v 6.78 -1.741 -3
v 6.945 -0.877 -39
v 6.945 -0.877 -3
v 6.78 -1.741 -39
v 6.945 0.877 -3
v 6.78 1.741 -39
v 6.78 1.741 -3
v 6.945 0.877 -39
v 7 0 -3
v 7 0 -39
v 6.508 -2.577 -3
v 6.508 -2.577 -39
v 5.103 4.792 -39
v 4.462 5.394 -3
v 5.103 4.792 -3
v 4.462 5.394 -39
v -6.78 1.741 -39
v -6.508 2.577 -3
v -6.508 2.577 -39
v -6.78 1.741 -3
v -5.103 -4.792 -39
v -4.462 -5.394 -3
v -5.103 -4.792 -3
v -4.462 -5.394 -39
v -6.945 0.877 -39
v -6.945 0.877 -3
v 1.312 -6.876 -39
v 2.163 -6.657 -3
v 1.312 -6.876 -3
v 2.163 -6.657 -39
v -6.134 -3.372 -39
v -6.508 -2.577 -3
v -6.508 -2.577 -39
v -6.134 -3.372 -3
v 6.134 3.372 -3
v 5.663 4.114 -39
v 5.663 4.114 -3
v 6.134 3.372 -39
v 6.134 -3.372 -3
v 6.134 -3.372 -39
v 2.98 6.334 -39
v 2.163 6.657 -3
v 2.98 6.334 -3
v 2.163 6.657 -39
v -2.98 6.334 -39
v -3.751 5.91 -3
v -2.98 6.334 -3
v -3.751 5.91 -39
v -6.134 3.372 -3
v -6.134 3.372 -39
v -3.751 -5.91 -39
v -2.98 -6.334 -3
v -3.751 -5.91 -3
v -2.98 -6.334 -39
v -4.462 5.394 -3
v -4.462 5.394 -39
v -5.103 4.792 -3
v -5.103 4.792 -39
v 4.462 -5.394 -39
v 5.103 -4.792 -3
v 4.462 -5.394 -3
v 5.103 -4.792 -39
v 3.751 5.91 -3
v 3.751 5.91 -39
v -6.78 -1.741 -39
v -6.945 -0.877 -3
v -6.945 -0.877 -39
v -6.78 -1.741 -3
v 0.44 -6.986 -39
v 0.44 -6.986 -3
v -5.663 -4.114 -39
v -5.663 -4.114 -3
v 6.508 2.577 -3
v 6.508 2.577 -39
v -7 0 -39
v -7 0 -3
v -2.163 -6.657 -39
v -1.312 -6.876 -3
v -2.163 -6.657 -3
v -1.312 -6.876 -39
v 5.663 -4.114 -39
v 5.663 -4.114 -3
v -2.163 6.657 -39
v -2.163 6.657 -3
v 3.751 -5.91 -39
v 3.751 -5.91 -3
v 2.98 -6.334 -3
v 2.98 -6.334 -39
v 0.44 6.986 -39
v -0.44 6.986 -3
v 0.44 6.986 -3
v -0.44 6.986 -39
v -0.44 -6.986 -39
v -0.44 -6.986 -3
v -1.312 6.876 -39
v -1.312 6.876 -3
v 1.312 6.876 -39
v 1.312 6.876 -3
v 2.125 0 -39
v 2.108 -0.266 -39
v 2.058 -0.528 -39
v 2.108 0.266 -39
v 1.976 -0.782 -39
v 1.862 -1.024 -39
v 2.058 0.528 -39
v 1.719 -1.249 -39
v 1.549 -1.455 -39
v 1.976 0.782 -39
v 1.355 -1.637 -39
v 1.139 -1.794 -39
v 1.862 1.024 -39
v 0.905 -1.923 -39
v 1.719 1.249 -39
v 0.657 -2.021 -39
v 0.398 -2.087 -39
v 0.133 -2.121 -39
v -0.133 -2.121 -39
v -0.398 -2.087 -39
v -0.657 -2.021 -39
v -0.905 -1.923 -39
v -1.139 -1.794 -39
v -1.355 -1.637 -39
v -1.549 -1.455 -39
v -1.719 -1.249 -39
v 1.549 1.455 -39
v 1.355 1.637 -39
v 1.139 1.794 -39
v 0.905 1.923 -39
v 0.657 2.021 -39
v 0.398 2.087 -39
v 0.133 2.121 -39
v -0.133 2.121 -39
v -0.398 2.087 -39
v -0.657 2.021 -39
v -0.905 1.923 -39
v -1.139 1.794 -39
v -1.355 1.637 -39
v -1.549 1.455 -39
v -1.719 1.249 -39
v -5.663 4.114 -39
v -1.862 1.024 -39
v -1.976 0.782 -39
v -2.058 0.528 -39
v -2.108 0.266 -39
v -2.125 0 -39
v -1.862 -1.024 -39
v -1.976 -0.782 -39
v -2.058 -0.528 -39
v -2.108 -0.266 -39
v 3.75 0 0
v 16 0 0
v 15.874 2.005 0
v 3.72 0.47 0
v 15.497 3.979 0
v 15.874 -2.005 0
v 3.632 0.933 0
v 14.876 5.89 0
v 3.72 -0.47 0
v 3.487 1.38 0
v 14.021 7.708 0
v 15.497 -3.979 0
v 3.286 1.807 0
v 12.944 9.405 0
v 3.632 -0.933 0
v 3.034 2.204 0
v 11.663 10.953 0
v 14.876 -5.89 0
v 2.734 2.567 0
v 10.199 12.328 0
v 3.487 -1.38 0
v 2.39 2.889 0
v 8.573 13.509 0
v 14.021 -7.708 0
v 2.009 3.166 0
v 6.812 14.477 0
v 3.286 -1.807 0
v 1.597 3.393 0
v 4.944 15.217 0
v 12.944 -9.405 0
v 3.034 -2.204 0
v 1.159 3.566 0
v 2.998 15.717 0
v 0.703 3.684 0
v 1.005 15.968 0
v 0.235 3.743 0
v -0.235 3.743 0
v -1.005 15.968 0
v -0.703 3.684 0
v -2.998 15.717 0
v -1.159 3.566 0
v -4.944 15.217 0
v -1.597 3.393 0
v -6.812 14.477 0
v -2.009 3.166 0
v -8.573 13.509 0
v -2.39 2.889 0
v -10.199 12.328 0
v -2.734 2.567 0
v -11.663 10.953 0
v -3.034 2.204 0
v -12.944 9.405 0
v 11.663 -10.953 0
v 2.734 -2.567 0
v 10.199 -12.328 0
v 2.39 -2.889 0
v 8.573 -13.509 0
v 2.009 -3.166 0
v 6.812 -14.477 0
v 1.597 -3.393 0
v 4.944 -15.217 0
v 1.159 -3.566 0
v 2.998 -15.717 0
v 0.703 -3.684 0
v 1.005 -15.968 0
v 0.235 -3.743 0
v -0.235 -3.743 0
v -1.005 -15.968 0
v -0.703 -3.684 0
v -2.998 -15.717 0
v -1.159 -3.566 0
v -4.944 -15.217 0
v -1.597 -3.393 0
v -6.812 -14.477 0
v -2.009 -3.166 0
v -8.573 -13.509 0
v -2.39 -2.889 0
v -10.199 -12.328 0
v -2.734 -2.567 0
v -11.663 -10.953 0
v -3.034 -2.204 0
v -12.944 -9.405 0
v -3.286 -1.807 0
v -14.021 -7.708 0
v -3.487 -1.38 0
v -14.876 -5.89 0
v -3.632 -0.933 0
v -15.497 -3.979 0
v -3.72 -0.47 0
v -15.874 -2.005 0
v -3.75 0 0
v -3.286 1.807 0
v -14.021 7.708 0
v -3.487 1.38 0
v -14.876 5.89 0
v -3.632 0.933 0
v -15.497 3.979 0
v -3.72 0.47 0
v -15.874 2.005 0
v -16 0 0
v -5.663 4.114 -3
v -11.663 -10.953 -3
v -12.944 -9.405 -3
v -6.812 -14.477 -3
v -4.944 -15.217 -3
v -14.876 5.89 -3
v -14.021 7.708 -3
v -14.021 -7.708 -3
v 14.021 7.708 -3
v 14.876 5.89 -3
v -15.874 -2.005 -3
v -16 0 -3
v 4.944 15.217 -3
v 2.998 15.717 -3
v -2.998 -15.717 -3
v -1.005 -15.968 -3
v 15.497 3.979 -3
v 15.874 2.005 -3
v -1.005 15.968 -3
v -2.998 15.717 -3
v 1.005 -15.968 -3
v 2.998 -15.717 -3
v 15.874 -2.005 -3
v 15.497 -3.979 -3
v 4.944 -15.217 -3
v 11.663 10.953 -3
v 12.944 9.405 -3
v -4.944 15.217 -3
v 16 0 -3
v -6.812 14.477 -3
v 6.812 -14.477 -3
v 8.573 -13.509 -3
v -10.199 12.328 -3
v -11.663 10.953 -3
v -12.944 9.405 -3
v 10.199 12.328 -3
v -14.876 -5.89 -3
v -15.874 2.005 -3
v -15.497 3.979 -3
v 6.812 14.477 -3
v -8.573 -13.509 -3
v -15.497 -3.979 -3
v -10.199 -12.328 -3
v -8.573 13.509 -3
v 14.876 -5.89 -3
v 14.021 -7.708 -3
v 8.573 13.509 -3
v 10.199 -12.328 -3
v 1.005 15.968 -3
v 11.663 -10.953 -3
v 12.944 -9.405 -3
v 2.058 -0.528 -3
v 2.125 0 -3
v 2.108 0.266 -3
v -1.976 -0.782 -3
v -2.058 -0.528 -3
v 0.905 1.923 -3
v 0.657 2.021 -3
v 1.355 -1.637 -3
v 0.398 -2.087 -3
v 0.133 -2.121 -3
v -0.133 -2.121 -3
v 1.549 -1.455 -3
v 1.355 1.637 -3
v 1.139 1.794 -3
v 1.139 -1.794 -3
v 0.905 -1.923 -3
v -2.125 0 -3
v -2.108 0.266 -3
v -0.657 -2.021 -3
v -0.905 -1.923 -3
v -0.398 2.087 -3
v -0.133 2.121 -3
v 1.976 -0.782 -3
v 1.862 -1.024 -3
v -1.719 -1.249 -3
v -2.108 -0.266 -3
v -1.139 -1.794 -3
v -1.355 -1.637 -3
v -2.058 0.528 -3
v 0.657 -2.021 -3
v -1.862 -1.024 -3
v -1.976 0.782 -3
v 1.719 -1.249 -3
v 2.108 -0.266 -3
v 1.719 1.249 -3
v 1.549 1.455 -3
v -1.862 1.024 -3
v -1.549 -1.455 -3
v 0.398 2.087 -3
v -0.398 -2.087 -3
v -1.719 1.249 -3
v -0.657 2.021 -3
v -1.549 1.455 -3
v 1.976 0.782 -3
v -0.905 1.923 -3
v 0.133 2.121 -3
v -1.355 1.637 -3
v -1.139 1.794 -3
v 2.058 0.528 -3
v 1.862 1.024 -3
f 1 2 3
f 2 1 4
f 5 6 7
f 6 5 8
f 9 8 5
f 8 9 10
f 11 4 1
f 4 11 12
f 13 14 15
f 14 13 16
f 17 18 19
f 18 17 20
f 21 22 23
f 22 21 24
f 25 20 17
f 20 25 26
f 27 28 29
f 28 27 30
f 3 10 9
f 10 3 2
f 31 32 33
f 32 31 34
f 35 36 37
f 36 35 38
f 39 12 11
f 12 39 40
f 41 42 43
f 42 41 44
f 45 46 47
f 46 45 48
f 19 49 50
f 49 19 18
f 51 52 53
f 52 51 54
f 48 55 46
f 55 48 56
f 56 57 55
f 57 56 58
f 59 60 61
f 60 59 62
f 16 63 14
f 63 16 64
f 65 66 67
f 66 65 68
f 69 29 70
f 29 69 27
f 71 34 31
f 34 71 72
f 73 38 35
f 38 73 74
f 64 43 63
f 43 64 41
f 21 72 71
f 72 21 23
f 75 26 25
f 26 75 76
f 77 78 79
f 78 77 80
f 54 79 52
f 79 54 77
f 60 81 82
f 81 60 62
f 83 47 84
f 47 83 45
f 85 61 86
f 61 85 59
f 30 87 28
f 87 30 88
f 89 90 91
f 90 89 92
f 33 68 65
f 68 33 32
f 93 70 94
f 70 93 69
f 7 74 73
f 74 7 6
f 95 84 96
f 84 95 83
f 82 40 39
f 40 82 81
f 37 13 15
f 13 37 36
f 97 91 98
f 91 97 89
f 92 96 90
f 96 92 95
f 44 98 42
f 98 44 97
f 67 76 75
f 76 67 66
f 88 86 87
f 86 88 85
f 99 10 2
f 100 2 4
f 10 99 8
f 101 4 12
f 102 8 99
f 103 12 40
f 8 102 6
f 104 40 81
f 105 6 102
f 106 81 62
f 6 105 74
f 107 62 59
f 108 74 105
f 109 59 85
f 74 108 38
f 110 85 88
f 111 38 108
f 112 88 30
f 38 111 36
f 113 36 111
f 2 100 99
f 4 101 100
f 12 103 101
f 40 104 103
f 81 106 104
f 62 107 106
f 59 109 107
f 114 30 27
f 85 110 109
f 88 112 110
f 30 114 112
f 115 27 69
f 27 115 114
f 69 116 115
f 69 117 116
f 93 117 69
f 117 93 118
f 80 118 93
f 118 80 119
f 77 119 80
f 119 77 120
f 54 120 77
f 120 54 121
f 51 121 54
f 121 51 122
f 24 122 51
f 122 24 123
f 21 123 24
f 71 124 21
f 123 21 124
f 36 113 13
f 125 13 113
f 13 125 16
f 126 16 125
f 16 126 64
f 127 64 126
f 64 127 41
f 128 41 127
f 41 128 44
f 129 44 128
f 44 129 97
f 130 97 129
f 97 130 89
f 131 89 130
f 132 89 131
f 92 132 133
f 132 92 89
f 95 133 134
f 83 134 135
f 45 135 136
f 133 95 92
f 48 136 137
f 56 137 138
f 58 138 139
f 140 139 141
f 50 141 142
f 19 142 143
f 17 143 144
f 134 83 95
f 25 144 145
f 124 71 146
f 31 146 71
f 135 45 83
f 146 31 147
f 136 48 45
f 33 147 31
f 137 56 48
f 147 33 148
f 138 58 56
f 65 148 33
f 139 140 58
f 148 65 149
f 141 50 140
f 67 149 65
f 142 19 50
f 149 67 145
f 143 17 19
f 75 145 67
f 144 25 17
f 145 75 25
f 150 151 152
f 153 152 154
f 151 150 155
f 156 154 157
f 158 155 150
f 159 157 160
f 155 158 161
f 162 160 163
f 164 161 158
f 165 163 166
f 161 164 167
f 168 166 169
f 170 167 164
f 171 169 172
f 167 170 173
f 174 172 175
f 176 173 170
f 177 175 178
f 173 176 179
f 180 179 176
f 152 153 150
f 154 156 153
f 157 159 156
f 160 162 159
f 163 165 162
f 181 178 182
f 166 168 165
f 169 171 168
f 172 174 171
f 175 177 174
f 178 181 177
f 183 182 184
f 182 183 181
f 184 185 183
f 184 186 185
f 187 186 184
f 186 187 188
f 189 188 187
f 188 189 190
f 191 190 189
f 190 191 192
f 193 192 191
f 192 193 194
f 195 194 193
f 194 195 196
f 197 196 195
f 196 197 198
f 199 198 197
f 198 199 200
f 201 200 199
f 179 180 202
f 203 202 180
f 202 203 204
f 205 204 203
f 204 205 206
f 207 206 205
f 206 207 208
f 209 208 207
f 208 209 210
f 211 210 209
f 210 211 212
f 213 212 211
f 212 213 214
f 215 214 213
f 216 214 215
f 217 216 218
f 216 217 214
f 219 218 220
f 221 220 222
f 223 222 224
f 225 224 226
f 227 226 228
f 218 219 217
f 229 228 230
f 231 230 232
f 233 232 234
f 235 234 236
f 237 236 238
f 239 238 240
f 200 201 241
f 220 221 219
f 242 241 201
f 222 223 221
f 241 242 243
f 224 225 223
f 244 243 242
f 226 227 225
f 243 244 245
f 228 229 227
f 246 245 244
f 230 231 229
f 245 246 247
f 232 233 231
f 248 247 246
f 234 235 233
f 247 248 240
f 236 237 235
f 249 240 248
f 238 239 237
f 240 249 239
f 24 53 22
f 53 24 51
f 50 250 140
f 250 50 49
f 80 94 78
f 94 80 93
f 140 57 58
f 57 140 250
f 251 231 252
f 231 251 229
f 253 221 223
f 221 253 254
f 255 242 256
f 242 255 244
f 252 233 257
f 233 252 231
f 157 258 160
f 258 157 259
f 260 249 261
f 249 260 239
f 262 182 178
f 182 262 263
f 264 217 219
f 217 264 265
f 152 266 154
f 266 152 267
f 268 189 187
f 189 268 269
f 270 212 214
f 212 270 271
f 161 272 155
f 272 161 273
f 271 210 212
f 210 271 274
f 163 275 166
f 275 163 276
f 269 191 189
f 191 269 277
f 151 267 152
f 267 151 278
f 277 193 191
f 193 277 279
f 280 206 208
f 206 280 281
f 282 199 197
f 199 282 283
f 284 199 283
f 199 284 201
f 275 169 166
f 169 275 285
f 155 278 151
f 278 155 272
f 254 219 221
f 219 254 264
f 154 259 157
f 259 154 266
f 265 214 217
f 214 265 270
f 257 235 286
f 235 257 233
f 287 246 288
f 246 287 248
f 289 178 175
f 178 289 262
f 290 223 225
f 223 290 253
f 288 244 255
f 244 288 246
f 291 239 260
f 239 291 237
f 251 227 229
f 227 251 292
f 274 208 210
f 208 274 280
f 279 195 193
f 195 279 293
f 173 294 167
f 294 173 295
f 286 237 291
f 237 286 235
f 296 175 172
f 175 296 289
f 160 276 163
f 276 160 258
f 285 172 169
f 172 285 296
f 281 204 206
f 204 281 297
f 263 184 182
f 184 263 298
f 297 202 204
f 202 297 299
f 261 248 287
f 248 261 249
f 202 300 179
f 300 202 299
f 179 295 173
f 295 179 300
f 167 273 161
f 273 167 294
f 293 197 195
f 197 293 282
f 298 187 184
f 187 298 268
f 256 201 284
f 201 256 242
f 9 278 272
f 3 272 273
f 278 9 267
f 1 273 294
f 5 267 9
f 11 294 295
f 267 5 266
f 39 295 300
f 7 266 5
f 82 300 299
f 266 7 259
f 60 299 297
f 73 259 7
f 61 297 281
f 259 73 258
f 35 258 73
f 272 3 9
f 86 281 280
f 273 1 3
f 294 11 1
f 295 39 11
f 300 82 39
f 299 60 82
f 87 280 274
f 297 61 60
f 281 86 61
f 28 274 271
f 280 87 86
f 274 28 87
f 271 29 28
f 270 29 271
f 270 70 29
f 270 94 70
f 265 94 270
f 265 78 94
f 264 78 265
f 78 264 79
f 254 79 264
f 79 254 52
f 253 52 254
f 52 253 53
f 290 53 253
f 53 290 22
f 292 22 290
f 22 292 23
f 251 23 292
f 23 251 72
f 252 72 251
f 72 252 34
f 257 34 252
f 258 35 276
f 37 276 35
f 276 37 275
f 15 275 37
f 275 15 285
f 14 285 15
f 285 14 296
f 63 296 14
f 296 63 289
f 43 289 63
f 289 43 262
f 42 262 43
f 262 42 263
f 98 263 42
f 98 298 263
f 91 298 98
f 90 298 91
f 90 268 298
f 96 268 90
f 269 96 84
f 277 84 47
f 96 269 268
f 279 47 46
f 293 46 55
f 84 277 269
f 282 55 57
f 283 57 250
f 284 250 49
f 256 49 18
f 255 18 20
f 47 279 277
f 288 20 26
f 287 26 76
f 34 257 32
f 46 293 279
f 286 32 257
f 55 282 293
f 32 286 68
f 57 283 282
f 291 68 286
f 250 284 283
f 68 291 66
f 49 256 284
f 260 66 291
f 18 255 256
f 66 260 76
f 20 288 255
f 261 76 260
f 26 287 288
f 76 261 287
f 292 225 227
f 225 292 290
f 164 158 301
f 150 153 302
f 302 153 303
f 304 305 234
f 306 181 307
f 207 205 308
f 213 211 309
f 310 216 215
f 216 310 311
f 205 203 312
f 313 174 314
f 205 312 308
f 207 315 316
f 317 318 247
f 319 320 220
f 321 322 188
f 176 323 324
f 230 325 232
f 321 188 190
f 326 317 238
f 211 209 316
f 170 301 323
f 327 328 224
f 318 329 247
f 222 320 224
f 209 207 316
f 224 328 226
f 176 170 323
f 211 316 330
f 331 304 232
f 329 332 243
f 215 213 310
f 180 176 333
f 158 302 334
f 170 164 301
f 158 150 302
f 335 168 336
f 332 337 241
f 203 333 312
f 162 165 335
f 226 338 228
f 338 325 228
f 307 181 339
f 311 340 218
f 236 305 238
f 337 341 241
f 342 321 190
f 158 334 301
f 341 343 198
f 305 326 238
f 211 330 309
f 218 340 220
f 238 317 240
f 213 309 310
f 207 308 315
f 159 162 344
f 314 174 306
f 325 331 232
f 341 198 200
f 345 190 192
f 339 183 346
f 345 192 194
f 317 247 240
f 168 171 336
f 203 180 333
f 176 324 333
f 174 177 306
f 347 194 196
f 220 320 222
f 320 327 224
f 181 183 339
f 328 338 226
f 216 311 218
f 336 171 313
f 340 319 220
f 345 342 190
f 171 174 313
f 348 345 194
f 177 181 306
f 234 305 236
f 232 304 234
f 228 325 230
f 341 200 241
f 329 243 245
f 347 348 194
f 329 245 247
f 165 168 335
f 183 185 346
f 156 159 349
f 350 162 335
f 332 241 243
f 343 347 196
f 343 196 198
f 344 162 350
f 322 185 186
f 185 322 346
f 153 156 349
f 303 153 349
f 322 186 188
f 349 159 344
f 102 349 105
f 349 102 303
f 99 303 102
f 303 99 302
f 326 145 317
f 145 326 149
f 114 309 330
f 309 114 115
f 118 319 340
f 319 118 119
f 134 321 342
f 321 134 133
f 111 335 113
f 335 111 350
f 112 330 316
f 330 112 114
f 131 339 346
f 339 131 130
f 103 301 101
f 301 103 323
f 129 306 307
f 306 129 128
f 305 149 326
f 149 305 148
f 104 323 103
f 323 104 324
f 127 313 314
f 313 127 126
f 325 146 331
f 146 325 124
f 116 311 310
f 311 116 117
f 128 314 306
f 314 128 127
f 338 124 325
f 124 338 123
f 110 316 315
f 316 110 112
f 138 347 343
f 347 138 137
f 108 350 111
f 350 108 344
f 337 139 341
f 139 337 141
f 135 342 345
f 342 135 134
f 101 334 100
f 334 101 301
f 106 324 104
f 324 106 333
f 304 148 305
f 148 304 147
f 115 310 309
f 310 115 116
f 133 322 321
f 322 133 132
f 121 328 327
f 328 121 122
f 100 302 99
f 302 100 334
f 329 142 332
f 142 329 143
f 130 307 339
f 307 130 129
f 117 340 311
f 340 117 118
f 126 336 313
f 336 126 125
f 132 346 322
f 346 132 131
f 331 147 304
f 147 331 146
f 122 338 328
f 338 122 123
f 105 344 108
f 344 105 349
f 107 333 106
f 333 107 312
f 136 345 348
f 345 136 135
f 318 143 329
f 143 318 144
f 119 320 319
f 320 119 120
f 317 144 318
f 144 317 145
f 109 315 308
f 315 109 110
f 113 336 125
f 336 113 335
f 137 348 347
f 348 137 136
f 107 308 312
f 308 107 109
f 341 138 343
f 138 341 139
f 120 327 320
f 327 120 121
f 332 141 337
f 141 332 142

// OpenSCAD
$fn = 50;


difference() {
	union() {
		translate(v = [0, 0, -39.0000000000]) {
			cylinder(h = 39, r = 7.0000000000);
		}
		translate(v = [0, 0, -3.0000000000]) {
			cylinder(h = 3, r = 16.0000000000);
		}
	}
	union() {
		translate(v = [0, 0, 0]) {
			rotate(a = [0, 0, 0]) {
				difference() {
					union() {
						#translate(v = [0, 0, -39.0000000000]) {
							cylinder(h = 39, r = 2.0000000000);
						}
						#translate(v = [0, 0, -3]) {
							cylinder(h = 3, r = 7.0000000000, r1 = 2.1250000000, r2 = 3.7500000000);
						}
						#translate(v = [0, 0, -39.0000000000]) {
							cylinder(h = 39, r = 2.1250000000);
						}
						#translate(v = [0, 0, -39.0000000000]) {
							cylinder(h = 39, r = 2.0000000000);
						}
					}
					union();
				}
			}
		}
	}
}
